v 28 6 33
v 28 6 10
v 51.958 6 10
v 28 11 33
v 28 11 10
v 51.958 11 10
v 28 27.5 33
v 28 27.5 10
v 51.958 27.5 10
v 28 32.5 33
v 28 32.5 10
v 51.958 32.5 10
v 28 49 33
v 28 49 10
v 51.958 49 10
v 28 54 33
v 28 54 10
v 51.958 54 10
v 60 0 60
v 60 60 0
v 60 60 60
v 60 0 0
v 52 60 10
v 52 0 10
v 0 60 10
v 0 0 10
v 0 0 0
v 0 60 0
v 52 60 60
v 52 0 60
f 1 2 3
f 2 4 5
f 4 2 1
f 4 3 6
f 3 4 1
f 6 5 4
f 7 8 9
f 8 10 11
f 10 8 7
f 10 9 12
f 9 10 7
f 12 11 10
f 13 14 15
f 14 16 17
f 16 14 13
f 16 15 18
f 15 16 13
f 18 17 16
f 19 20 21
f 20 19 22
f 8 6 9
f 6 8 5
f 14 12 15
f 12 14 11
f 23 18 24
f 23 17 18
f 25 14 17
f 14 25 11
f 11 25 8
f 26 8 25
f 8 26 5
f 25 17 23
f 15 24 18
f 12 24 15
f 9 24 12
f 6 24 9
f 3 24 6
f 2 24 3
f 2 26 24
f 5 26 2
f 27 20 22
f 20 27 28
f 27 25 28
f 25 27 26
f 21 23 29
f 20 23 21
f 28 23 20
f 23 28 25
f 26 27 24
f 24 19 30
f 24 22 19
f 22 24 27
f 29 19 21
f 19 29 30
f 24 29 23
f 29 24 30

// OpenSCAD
$fn = 32;

// ----------------------------------------------------------------------
// Rib bracket: 3-gusset L bracket
// ----------------------------------------------------------------------

// --- parameters (mm) ---
base_l = 60;              // foot length, X
base_w = 60;              // foot width, Y
base_t = 10;              // foot thickness
plate_t = 8;              // upright plate thickness
plate_h = 60;             // overall height
gus_l = 24;               // gusset leg along the foot
gus_h = 24;               // gusset height
gus_t = 5;                // gusset thickness
gus_edge = 6;             // gusset margin from the foot edge
n_gus = 3;                // gusset count

gus_pitch = (base_w - 2 * gus_edge - gus_t) / (n_gus - 1);  // gusset pitch

union() {
  cube([base_l, base_w, base_t]);
  translate([base_l - plate_t, 0, base_t - 1])
    cube([plate_t, base_w, plate_h - base_t + 1]);
  for (i = [0 : n_gus - 1])
    translate([base_l - plate_t - gus_l, gus_edge + i * gus_pitch, base_t - 1])
      rotate([-90, 0, 0])
        linear_extrude(height = gus_t)
          polygon(points = [[0, 0], [gus_l + 1, 0], [0, -gus_h]]);
}
